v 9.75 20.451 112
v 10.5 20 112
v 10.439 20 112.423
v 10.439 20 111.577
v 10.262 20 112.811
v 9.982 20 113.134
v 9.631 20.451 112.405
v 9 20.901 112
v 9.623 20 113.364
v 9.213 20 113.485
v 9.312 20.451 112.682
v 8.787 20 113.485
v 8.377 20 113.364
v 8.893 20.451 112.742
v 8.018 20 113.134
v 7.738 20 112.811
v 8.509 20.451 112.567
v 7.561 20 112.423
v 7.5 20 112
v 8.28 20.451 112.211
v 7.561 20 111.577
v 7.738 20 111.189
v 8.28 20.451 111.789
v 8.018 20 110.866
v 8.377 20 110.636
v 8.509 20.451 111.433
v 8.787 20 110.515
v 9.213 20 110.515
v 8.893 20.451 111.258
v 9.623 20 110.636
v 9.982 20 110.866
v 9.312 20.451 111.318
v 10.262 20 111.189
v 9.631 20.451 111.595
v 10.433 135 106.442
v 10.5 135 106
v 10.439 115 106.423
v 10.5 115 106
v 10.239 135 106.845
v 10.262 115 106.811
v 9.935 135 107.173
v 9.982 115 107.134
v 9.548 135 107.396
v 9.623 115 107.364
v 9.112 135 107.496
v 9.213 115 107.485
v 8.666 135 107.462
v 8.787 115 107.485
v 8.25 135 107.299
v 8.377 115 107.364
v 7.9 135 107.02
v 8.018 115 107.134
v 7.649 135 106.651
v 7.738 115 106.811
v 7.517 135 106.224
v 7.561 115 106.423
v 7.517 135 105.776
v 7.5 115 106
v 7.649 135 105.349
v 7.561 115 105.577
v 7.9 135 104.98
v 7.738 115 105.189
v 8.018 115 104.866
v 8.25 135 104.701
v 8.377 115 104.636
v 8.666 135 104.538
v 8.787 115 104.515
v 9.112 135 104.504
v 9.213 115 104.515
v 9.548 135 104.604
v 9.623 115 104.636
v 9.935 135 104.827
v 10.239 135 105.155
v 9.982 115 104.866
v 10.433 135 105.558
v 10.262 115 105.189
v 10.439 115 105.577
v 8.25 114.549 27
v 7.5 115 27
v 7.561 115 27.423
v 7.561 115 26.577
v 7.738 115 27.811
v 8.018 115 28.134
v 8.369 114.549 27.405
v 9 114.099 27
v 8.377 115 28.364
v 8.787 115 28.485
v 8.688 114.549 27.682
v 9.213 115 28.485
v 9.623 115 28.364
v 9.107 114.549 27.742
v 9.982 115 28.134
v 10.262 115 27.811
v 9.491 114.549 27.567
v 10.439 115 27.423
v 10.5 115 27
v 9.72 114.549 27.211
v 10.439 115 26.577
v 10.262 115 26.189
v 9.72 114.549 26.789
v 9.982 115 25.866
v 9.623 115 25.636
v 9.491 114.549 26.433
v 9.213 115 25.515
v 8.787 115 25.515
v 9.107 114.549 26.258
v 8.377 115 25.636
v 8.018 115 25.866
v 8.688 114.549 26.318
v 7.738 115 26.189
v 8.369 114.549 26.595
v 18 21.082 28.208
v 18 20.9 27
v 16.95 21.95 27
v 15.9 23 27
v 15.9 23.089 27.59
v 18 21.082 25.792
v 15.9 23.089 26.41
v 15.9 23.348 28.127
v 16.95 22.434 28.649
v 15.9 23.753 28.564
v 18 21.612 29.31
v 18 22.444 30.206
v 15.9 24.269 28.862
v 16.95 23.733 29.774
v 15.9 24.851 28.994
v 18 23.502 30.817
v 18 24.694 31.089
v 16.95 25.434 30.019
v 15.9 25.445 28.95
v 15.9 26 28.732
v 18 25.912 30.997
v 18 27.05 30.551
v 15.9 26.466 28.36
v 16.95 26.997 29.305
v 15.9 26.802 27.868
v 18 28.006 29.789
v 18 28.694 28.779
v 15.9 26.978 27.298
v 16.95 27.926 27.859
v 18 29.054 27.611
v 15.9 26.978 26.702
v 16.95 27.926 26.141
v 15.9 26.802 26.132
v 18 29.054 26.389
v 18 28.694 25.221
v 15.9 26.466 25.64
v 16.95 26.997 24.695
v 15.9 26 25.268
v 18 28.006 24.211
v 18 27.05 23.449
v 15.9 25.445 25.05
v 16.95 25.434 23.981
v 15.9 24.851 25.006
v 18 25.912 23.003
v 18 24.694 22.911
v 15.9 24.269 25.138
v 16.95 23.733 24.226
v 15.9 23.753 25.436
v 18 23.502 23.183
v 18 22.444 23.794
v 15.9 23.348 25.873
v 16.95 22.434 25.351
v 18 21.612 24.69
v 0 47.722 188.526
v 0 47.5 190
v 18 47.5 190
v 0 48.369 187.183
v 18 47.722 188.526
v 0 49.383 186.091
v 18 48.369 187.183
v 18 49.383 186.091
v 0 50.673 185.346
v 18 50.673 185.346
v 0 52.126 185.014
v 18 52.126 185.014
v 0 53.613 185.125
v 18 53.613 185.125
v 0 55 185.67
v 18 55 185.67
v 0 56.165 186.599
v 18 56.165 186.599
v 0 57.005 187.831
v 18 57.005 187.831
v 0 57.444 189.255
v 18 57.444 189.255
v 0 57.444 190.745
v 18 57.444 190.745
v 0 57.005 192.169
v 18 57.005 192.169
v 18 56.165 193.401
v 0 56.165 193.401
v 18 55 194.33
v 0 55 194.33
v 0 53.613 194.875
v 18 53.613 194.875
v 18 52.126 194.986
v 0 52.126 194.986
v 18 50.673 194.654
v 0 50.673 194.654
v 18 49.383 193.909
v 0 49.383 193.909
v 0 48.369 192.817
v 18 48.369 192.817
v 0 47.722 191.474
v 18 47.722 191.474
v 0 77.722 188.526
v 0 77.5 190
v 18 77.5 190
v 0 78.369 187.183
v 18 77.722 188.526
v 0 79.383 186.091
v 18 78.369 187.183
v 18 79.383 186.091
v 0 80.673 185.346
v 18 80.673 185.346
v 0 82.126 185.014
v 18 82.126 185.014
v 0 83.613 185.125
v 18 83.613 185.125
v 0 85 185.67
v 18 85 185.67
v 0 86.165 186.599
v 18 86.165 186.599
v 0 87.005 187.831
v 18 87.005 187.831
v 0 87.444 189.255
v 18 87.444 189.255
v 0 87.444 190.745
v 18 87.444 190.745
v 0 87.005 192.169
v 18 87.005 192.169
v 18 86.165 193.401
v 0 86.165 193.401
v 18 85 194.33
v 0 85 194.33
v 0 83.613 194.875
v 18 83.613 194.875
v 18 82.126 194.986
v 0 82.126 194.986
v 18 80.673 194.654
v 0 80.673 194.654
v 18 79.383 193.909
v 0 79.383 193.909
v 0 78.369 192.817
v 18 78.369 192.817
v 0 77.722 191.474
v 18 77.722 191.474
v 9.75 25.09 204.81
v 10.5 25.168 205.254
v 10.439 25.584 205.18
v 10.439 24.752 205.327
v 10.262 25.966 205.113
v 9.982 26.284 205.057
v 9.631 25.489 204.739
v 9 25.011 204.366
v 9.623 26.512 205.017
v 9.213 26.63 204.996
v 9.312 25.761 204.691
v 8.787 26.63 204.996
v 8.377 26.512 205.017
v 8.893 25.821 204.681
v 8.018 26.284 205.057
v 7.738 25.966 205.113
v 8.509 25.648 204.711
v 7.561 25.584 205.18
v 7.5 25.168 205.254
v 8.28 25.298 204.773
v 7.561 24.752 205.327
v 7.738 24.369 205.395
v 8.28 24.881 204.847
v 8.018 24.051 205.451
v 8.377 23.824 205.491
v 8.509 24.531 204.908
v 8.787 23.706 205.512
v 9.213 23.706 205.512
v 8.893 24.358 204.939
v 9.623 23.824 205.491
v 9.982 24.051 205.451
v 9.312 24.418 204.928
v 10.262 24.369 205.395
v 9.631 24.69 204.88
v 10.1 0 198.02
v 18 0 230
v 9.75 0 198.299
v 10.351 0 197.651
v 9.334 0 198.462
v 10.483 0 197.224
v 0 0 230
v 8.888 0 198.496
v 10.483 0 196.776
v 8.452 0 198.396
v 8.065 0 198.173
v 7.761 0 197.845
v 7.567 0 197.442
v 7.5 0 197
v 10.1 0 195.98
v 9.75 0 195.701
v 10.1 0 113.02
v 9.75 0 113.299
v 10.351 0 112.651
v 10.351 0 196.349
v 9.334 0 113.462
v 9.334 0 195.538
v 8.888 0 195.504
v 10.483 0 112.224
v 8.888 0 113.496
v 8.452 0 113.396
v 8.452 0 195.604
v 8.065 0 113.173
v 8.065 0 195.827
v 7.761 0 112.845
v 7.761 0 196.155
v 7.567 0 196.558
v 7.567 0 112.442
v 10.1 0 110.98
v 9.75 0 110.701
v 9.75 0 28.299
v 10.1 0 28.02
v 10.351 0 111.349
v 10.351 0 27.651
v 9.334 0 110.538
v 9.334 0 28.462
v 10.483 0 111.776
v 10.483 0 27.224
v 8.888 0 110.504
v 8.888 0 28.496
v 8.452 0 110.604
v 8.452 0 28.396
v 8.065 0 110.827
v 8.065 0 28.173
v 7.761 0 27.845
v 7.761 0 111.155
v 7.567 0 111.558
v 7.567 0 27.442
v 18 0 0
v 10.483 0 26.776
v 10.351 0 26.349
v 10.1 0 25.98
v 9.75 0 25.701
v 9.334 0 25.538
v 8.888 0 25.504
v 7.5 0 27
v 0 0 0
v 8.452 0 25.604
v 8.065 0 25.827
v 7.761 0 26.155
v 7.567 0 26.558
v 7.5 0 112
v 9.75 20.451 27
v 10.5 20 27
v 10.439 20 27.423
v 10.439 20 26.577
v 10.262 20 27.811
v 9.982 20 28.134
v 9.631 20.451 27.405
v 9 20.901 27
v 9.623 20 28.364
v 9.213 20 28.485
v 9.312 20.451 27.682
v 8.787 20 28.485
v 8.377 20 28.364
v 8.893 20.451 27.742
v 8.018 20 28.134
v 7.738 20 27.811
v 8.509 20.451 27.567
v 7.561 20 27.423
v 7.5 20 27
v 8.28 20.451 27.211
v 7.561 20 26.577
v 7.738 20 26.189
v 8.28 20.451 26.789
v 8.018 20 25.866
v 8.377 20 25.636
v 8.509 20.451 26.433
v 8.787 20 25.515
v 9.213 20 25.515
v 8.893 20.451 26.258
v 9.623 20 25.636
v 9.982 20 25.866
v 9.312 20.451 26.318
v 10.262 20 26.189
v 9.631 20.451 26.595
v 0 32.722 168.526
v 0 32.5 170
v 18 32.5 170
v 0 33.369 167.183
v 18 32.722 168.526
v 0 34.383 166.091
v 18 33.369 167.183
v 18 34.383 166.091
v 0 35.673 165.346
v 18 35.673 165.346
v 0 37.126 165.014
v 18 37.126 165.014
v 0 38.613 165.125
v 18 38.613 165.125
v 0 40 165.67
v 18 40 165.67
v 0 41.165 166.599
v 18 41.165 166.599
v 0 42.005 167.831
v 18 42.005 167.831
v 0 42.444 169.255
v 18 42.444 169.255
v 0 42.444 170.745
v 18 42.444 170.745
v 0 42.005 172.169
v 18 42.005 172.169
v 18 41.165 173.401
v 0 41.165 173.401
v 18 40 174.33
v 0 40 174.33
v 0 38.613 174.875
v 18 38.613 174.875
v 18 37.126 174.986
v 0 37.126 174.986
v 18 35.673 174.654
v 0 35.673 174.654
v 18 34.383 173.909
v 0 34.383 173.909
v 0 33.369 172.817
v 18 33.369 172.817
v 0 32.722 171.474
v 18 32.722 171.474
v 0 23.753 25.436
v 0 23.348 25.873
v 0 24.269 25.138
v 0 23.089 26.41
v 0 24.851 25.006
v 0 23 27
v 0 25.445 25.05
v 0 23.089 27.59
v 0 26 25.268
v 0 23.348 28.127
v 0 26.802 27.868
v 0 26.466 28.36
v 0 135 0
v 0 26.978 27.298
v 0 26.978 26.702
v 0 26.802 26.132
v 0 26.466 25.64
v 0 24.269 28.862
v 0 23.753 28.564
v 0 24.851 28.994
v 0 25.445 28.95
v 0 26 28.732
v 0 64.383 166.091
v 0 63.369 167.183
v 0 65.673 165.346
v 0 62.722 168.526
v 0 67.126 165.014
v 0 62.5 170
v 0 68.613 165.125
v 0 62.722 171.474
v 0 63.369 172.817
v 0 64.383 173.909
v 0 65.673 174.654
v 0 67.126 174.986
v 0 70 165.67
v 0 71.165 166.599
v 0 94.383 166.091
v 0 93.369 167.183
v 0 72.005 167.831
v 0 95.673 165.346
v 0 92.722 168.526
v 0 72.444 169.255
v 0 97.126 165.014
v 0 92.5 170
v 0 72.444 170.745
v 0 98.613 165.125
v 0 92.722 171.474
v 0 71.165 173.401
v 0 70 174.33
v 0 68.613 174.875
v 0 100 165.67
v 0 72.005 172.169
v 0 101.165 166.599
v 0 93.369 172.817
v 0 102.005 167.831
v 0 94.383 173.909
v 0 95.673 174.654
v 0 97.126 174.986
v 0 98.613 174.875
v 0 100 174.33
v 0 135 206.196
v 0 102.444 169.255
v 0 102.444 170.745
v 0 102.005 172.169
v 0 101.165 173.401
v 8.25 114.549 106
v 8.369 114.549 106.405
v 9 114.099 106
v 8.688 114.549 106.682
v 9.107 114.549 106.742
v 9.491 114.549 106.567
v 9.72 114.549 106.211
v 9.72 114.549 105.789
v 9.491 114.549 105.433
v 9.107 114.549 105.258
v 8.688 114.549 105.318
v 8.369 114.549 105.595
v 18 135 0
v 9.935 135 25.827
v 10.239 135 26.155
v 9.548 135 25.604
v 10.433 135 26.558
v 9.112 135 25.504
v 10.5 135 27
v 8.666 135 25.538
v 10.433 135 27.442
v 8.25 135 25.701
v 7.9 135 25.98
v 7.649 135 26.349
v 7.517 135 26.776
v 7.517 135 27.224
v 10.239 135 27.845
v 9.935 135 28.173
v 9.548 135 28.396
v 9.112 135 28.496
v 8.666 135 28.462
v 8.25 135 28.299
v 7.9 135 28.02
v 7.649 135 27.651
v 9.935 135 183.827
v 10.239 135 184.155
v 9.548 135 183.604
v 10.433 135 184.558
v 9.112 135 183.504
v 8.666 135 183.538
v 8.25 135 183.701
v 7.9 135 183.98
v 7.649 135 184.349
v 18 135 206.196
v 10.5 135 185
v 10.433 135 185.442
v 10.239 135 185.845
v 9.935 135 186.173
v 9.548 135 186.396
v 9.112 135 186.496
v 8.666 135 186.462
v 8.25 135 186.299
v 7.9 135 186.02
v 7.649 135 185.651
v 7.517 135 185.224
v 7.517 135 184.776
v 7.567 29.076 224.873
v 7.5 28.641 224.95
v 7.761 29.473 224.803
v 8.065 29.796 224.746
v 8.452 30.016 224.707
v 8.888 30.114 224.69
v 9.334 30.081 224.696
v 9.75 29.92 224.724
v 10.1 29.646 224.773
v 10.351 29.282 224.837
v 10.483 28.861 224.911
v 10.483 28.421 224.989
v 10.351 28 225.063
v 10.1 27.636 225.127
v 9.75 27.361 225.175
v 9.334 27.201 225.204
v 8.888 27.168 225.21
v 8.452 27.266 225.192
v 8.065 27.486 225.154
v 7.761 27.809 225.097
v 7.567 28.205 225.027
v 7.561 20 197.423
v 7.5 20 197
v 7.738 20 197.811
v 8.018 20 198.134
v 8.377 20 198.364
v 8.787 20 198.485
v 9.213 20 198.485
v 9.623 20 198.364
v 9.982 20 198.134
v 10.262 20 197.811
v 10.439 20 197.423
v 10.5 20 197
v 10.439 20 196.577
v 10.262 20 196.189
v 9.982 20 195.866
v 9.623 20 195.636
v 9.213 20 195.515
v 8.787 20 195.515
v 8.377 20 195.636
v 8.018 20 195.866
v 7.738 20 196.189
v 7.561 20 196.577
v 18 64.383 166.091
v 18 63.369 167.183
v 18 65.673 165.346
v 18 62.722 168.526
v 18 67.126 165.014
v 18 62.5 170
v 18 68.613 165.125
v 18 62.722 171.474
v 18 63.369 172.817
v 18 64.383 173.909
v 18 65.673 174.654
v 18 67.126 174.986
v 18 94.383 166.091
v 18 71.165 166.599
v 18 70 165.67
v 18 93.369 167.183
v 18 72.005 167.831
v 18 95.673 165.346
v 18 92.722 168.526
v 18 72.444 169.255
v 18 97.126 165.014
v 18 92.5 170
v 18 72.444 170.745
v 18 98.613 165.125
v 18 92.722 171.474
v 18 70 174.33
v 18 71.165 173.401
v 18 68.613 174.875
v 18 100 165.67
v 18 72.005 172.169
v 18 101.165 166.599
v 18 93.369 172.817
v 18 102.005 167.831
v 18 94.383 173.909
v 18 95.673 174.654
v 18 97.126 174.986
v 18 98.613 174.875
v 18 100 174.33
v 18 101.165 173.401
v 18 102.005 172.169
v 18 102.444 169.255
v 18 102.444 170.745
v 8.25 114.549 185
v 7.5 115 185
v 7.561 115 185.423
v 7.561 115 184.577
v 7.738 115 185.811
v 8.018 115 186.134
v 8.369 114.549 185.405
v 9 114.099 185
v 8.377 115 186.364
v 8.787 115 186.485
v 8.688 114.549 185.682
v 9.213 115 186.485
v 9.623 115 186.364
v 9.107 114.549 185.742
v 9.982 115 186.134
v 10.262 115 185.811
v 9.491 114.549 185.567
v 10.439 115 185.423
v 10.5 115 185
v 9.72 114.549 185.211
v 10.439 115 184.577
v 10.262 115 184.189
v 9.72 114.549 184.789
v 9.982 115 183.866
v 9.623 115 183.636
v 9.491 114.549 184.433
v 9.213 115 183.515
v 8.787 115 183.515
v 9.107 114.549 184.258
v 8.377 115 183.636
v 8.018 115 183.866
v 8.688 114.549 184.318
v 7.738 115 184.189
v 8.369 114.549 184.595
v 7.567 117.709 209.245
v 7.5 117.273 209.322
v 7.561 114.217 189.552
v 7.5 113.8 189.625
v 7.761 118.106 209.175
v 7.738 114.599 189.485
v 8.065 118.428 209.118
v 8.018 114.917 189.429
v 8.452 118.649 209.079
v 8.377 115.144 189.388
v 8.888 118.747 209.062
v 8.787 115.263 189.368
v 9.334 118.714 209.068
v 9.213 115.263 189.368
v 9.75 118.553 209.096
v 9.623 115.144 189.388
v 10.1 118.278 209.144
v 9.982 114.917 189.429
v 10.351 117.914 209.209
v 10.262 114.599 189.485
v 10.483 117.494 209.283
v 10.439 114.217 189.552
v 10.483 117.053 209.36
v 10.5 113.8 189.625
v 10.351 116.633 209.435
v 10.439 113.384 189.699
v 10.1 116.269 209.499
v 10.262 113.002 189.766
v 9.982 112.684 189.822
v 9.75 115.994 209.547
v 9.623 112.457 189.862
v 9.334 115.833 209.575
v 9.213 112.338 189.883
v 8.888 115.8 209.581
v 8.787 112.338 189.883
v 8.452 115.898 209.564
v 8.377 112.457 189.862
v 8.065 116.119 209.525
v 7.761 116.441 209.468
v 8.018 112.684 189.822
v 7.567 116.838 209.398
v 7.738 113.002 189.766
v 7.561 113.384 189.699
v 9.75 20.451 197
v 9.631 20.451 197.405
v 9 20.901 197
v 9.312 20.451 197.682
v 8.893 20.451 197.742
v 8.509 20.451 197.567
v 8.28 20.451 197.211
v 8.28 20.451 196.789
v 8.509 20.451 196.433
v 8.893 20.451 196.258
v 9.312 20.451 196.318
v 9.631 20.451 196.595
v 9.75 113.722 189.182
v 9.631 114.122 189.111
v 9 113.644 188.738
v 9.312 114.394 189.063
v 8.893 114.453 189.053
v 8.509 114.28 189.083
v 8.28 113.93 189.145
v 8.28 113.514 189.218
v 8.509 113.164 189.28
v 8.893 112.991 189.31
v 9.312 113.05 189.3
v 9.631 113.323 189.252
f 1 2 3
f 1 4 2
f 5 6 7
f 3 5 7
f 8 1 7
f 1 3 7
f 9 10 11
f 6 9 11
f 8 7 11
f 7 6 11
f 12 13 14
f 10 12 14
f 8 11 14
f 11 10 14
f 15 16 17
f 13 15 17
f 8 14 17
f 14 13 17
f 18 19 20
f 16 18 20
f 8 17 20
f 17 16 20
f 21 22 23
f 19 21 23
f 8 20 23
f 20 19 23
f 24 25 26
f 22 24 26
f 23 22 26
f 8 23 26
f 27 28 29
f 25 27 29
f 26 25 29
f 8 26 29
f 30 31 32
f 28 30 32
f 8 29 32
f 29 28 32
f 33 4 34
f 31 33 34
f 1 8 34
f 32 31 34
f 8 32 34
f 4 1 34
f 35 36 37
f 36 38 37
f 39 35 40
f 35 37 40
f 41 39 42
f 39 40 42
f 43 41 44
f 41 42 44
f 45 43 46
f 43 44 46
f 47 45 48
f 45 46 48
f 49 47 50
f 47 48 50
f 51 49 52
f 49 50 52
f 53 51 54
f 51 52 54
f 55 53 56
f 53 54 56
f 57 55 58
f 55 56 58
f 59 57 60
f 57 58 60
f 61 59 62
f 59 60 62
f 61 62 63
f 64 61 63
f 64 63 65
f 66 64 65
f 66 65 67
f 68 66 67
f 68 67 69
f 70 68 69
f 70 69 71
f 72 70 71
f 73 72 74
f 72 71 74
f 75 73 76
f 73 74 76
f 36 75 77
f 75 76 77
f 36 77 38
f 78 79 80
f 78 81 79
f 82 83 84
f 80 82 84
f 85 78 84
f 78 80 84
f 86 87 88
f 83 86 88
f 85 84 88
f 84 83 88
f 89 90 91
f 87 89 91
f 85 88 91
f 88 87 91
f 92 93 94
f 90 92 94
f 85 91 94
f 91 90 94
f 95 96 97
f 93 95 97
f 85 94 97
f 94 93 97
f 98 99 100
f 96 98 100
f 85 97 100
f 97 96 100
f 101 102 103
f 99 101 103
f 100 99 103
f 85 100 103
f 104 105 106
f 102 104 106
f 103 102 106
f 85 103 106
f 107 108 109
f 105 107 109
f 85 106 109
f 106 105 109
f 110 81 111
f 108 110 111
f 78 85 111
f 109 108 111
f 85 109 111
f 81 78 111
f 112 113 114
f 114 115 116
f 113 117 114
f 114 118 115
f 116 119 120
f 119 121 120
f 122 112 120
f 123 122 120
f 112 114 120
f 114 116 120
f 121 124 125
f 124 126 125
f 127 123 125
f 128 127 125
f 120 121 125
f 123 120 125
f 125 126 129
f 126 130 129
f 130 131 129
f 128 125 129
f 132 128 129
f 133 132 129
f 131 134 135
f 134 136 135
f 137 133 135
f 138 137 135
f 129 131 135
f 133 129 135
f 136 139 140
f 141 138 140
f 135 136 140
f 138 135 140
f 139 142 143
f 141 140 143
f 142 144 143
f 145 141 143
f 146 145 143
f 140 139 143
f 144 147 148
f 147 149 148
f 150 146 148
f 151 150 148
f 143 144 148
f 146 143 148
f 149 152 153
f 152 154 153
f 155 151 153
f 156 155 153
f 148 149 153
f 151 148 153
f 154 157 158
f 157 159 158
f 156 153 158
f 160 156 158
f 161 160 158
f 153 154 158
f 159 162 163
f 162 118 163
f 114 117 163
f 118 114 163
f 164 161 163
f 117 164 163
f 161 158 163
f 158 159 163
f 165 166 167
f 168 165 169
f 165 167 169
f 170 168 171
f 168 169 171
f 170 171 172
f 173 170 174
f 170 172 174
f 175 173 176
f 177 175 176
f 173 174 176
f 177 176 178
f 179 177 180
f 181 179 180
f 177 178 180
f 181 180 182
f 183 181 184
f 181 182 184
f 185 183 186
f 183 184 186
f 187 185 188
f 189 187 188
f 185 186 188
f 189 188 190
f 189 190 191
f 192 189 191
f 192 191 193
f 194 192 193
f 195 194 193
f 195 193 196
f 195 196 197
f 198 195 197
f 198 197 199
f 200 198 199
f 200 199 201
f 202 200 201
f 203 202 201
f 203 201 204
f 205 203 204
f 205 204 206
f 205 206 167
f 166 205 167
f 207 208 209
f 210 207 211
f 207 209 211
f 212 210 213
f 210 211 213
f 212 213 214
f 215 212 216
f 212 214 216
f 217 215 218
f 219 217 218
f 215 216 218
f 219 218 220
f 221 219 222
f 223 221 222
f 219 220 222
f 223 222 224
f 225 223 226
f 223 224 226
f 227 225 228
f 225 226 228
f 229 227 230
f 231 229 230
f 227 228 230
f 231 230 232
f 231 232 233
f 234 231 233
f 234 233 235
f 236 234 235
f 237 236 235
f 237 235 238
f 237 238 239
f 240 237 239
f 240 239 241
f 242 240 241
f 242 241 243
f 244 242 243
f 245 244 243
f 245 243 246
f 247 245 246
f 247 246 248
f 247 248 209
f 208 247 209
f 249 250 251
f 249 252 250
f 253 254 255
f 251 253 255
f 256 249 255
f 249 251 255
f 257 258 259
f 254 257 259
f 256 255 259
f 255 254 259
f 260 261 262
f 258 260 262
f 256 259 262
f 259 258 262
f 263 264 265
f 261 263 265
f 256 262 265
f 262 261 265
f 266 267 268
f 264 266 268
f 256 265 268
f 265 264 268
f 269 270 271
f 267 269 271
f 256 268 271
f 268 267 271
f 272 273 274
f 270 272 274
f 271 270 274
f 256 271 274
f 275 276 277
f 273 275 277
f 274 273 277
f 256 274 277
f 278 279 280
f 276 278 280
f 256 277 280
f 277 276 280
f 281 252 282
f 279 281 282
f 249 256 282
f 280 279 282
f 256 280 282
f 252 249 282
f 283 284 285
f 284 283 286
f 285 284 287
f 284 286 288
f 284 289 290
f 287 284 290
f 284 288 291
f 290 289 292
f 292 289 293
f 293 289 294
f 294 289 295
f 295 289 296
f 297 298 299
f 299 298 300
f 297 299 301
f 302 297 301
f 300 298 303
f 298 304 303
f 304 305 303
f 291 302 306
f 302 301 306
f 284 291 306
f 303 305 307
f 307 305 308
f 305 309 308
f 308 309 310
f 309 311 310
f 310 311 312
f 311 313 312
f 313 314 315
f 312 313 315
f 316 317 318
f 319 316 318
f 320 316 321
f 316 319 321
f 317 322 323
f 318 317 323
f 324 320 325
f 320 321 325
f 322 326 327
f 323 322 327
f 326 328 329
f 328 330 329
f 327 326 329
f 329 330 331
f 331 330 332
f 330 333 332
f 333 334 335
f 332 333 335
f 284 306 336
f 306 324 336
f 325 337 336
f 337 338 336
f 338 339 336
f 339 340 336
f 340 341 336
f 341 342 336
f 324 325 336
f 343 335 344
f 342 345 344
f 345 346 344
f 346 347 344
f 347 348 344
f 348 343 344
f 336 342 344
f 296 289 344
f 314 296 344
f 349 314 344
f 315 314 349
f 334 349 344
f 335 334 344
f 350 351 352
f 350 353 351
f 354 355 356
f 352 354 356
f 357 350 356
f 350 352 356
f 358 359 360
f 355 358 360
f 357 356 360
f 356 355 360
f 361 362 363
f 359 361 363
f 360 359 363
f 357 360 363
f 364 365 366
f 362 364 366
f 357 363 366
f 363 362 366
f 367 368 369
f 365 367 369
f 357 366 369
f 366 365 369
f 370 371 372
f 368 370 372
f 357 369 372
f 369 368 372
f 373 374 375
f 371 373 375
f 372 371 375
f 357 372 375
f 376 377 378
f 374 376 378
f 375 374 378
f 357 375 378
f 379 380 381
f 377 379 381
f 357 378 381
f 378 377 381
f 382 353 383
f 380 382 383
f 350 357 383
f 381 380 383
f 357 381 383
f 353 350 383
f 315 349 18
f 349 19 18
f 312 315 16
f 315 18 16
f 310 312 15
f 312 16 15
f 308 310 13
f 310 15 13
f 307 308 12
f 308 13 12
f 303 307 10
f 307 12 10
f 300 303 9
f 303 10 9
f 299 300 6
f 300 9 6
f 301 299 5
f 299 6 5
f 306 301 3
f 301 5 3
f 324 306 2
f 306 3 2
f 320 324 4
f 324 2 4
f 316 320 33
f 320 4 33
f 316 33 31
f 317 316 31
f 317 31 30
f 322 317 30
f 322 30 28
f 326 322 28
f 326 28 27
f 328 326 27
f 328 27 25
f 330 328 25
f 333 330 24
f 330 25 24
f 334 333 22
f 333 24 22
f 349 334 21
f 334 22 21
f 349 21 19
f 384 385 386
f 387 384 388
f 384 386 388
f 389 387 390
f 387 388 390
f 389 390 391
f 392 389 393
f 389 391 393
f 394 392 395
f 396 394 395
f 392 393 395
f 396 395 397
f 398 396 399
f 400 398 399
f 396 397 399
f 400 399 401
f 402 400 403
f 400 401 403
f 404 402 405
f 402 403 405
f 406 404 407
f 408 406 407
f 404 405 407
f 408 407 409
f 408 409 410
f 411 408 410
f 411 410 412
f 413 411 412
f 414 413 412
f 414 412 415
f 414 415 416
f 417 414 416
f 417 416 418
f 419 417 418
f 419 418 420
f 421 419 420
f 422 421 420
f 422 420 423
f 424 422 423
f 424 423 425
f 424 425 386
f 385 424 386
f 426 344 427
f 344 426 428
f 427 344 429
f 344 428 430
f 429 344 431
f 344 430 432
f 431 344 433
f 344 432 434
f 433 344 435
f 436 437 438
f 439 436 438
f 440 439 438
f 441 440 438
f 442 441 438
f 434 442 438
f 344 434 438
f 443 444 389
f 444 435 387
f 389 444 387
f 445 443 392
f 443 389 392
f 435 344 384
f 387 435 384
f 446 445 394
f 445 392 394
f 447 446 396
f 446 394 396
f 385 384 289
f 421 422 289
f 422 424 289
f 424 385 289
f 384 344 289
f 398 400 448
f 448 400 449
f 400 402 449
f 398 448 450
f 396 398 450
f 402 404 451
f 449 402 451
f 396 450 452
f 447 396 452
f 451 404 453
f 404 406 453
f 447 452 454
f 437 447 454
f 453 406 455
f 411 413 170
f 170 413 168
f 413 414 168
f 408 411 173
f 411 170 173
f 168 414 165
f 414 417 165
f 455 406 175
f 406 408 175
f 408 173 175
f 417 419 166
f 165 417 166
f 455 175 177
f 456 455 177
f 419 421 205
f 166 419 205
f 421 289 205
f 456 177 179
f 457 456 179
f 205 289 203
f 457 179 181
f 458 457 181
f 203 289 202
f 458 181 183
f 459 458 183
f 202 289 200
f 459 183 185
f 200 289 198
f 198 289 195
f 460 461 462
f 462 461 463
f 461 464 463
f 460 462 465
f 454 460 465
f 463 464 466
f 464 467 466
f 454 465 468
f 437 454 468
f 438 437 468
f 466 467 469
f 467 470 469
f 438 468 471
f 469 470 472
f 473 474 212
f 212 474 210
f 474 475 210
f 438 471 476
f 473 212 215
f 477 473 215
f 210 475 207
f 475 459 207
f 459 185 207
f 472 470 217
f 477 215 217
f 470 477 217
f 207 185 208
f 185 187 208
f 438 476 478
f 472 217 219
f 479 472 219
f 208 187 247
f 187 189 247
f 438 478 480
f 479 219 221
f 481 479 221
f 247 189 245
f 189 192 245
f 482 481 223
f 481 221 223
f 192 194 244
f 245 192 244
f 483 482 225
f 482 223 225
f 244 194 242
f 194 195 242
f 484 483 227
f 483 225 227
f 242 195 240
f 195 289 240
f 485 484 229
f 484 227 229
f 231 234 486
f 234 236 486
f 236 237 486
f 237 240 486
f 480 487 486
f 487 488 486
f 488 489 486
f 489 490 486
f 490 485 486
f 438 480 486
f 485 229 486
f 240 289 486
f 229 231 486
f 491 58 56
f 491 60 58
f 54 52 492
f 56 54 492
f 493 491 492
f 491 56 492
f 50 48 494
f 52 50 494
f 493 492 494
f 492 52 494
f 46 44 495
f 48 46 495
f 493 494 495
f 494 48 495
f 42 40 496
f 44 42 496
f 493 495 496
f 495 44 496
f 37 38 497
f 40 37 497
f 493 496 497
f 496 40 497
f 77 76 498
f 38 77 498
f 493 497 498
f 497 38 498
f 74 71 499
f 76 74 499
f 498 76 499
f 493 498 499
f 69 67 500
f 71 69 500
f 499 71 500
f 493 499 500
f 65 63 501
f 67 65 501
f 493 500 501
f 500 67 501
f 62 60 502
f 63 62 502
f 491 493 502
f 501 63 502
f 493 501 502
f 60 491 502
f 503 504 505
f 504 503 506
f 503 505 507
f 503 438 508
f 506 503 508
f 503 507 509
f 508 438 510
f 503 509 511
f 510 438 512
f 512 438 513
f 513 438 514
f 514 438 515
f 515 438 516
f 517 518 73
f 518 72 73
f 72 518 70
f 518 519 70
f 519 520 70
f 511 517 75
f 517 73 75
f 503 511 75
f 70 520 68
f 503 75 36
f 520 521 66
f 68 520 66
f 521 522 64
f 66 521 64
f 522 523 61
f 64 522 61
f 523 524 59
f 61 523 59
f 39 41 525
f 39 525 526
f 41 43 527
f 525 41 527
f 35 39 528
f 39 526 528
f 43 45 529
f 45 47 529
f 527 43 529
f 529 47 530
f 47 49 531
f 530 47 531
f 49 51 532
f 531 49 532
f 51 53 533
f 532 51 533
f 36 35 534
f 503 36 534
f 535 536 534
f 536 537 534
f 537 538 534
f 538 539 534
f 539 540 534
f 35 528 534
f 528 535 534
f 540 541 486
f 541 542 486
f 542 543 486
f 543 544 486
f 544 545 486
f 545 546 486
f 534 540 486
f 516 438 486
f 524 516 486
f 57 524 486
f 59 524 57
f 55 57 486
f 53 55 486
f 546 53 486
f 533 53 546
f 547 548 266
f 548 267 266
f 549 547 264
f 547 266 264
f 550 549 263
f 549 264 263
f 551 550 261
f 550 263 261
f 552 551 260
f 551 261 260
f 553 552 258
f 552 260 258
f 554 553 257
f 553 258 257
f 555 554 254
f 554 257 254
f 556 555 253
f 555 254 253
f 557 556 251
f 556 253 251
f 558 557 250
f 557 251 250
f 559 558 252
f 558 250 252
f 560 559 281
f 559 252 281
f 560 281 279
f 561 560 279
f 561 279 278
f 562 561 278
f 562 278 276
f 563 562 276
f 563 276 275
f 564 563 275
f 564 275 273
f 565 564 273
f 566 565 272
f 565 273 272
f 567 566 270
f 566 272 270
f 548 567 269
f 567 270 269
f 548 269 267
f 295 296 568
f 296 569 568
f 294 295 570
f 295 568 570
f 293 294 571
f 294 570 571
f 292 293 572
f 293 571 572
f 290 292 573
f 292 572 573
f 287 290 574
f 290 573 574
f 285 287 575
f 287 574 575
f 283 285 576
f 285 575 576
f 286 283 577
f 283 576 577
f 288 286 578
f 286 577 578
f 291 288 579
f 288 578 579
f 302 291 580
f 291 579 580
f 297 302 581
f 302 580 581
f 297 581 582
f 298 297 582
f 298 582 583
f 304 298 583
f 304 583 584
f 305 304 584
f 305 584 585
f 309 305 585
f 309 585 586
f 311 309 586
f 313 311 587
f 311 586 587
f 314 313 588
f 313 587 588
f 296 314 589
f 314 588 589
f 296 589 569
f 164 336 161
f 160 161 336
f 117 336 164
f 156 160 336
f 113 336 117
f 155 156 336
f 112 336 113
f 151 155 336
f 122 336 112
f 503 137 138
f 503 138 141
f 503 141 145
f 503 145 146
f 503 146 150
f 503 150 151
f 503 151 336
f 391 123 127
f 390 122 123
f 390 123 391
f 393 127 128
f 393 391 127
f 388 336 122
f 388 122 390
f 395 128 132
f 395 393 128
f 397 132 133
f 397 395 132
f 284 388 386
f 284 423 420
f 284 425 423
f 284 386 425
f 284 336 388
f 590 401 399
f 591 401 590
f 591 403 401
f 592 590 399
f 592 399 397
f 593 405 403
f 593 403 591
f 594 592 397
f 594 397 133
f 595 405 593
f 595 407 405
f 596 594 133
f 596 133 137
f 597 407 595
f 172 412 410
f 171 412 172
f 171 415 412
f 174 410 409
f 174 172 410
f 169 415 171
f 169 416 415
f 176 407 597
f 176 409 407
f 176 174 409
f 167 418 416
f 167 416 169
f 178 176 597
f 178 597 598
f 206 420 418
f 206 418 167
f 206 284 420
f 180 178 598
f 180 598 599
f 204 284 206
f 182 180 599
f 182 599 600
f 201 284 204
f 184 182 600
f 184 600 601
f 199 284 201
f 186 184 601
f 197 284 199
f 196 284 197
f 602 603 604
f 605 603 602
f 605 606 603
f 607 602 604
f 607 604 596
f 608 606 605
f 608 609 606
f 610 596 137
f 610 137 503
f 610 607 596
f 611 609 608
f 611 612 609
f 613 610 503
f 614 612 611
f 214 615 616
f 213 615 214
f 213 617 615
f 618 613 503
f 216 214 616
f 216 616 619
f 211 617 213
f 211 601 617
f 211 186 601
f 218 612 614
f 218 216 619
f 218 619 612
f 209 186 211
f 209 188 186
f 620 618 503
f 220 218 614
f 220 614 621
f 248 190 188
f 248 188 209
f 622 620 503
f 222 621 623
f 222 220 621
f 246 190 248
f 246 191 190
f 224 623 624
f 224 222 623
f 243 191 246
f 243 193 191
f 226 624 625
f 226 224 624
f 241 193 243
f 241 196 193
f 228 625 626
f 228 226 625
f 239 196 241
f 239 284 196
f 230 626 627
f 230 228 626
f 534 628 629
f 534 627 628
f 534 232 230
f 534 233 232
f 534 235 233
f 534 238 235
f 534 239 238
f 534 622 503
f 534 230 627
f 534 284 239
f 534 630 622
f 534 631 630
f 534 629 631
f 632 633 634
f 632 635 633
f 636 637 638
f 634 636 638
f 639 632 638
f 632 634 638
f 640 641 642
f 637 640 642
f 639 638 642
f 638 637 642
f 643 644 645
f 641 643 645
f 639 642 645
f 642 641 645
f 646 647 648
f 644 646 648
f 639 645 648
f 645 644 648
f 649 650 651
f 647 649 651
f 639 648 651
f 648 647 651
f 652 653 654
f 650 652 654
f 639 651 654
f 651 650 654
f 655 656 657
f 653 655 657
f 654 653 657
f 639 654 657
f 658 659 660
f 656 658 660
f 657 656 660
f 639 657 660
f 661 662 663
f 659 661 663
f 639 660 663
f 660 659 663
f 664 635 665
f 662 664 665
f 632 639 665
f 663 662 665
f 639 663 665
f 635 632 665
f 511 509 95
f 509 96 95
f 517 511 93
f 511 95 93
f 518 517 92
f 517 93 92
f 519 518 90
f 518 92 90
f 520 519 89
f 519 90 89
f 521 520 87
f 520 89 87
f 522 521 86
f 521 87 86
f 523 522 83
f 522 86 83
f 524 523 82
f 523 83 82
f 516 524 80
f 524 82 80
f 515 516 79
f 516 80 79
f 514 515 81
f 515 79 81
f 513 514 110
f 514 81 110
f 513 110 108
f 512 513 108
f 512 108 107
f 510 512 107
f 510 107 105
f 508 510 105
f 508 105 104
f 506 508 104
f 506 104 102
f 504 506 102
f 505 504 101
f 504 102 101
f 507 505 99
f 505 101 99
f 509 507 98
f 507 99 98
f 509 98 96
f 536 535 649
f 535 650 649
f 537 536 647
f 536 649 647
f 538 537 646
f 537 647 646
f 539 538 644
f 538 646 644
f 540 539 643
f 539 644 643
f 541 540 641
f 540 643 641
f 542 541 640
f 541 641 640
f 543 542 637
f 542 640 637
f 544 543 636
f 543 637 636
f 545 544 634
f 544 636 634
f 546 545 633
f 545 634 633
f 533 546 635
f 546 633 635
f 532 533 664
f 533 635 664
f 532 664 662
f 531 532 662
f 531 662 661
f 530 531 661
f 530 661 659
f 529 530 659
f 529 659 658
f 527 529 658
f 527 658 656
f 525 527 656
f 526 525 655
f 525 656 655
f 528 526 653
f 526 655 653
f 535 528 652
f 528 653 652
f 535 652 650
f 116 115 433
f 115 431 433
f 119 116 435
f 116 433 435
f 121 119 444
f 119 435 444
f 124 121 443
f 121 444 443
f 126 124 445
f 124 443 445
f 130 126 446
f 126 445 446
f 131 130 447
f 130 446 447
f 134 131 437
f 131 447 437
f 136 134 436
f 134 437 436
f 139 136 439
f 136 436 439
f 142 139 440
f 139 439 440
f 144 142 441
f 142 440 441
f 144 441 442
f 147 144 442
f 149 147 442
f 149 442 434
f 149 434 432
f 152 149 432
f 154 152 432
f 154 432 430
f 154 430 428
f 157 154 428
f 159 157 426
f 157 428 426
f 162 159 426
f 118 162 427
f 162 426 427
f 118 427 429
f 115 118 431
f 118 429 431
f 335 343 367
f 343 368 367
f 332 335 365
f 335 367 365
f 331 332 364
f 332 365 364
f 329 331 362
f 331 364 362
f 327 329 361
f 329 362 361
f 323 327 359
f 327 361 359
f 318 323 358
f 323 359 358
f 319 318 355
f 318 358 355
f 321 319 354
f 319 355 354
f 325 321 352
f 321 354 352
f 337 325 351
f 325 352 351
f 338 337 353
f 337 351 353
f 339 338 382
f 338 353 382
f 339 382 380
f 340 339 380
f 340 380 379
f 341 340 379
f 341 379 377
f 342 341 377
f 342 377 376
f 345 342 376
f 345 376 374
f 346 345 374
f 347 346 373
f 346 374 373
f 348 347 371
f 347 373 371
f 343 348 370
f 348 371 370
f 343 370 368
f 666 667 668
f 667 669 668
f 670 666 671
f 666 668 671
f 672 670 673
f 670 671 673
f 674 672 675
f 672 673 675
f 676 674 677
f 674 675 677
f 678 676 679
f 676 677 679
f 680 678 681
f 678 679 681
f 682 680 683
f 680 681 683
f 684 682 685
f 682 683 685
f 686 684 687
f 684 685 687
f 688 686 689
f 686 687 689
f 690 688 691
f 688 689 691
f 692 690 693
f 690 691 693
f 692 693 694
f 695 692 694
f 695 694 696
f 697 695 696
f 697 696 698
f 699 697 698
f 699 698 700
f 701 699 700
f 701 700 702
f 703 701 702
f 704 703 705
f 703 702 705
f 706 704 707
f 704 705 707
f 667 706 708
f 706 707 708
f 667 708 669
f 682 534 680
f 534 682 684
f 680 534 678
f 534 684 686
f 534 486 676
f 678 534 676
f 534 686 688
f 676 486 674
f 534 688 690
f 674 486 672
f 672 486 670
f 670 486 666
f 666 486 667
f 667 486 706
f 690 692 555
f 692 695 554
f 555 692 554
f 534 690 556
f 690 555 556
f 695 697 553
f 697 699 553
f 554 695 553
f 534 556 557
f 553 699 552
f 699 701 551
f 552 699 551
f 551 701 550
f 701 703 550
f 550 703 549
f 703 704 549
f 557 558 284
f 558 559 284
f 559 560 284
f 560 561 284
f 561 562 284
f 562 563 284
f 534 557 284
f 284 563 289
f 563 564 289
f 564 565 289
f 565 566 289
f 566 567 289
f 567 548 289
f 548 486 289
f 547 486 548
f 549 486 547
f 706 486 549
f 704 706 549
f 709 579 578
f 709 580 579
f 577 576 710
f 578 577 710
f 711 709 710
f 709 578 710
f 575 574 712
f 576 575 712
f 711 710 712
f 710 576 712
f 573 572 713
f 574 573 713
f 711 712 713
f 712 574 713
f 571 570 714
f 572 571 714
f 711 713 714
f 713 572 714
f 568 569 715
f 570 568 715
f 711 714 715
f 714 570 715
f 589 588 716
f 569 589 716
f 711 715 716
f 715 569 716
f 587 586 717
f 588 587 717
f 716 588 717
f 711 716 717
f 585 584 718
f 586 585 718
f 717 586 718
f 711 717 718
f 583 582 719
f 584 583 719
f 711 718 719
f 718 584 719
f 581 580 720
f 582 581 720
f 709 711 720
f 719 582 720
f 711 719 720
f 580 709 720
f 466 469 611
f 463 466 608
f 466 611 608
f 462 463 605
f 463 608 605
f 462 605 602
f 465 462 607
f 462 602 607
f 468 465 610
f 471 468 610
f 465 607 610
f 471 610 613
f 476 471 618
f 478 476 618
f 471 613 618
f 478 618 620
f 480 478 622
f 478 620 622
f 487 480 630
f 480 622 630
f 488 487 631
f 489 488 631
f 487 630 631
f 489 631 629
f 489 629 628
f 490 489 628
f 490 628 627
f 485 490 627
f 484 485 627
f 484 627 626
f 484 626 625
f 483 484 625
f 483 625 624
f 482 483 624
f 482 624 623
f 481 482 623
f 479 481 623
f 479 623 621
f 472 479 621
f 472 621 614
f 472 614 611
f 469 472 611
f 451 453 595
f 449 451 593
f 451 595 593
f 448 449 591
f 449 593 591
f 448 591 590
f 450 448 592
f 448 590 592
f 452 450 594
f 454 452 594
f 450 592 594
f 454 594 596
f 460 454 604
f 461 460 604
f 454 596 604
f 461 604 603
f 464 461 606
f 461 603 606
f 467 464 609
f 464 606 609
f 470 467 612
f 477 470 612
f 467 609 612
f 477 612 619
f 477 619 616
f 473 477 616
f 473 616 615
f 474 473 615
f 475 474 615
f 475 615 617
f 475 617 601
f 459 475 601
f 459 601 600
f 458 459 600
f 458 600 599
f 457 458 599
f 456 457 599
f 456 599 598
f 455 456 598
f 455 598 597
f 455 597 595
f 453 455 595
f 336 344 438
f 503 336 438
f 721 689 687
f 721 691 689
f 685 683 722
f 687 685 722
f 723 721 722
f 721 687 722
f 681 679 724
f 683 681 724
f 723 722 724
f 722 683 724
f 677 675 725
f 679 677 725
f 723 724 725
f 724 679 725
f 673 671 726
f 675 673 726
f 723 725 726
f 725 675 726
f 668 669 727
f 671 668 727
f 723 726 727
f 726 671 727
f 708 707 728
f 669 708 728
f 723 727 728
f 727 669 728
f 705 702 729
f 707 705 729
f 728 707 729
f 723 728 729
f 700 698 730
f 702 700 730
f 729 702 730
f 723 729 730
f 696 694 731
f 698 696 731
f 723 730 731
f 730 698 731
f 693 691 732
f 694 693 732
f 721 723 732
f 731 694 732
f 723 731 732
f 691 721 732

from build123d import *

# Parameters (mm, degrees)
F1_DEPTH       = 18
F2_D           = 10
F3_D           = 10
F5_D           = 4
F5_CSINK_D     = 8.2
F5_CSINK_ANGLE = 90
F7_D           = 3
F7_DEPTH       = 20
F7_TIP         = 0.9012909285
F9_D           = 3
F9_DEPTH       = 20
F9_TIP         = 0.9012909285
F11_D          = 3
F11_DEPTH      = 20
F11_TIP        = 0.9012909285


with BuildPart() as f1:
    # F0 (on Right) → F1 (new body)
    with BuildSketch(Plane.YZ):
        Polygon((0, 230), (0, 0), (135, 0), (135, 206.1958576044), align=None)
    extrude(amount=F1_DEPTH)

    # F2 (through all)
    with Locations(Plane(origin=(0, 0, 0), x_dir=(0, 1, 0), z_dir=(-1, 0, 0))):
        with Locations((37.5, -170), (67.5, -170), (97.5, -170)):
            Hole(F2_D / 2)

    # F3 (through all)
    with Locations(Plane(origin=(0, 0, 0), x_dir=(0, 1, 0), z_dir=(-1, 0, 0))):
        with Locations((52.5, -190), (82.5, -190)):
            Hole(F3_D / 2)

    # F5 (through all)
    with Locations(Plane.YZ.offset(18)):
        with Locations((25, 27)):
            CounterSinkHole(F5_D / 2, F5_CSINK_D / 2, counter_sink_angle=F5_CSINK_ANGLE)

    # F7
    with Locations(Plane(origin=(0, 135, 0), x_dir=(-1, 0, 0), z_dir=(0, 1, 0))):
        with Locations((-9, 27), (-9, 106), (-9, 185)):
            Hole(F7_D / 2, depth=F7_DEPTH)
            with Locations((0, 0, -(F7_DEPTH + F7_TIP / 2))):  # 118° drill point
                Cone(0, F7_D / 2, F7_TIP, mode=Mode.SUBTRACT)

    # F9
    with Locations(Plane.XZ):
        with Locations((9, 197), (9, 112), (9, 27)):
            Hole(F9_D / 2, depth=F9_DEPTH)
            with Locations((0, 0, -(F9_DEPTH + F9_TIP / 2))):  # 118° drill point
                Cone(0, F9_D / 2, F9_TIP, mode=Mode.SUBTRACT)

    # F11
    with Locations(Plane(origin=(0, 39.3323164825, 223.0646513904), x_dir=(1, 0, 0), z_dir=(0, 0.1736481777, 0.984807753))):
        with Locations((9, -10.8564882588), (9, 79.1435117412)):
            Hole(F11_D / 2, depth=F11_DEPTH)
            with Locations((0, 0, -(F11_DEPTH + F11_TIP / 2))):  # 118° drill point
                Cone(0, F11_D / 2, F11_TIP, mode=Mode.SUBTRACT)


solid = f1.part
